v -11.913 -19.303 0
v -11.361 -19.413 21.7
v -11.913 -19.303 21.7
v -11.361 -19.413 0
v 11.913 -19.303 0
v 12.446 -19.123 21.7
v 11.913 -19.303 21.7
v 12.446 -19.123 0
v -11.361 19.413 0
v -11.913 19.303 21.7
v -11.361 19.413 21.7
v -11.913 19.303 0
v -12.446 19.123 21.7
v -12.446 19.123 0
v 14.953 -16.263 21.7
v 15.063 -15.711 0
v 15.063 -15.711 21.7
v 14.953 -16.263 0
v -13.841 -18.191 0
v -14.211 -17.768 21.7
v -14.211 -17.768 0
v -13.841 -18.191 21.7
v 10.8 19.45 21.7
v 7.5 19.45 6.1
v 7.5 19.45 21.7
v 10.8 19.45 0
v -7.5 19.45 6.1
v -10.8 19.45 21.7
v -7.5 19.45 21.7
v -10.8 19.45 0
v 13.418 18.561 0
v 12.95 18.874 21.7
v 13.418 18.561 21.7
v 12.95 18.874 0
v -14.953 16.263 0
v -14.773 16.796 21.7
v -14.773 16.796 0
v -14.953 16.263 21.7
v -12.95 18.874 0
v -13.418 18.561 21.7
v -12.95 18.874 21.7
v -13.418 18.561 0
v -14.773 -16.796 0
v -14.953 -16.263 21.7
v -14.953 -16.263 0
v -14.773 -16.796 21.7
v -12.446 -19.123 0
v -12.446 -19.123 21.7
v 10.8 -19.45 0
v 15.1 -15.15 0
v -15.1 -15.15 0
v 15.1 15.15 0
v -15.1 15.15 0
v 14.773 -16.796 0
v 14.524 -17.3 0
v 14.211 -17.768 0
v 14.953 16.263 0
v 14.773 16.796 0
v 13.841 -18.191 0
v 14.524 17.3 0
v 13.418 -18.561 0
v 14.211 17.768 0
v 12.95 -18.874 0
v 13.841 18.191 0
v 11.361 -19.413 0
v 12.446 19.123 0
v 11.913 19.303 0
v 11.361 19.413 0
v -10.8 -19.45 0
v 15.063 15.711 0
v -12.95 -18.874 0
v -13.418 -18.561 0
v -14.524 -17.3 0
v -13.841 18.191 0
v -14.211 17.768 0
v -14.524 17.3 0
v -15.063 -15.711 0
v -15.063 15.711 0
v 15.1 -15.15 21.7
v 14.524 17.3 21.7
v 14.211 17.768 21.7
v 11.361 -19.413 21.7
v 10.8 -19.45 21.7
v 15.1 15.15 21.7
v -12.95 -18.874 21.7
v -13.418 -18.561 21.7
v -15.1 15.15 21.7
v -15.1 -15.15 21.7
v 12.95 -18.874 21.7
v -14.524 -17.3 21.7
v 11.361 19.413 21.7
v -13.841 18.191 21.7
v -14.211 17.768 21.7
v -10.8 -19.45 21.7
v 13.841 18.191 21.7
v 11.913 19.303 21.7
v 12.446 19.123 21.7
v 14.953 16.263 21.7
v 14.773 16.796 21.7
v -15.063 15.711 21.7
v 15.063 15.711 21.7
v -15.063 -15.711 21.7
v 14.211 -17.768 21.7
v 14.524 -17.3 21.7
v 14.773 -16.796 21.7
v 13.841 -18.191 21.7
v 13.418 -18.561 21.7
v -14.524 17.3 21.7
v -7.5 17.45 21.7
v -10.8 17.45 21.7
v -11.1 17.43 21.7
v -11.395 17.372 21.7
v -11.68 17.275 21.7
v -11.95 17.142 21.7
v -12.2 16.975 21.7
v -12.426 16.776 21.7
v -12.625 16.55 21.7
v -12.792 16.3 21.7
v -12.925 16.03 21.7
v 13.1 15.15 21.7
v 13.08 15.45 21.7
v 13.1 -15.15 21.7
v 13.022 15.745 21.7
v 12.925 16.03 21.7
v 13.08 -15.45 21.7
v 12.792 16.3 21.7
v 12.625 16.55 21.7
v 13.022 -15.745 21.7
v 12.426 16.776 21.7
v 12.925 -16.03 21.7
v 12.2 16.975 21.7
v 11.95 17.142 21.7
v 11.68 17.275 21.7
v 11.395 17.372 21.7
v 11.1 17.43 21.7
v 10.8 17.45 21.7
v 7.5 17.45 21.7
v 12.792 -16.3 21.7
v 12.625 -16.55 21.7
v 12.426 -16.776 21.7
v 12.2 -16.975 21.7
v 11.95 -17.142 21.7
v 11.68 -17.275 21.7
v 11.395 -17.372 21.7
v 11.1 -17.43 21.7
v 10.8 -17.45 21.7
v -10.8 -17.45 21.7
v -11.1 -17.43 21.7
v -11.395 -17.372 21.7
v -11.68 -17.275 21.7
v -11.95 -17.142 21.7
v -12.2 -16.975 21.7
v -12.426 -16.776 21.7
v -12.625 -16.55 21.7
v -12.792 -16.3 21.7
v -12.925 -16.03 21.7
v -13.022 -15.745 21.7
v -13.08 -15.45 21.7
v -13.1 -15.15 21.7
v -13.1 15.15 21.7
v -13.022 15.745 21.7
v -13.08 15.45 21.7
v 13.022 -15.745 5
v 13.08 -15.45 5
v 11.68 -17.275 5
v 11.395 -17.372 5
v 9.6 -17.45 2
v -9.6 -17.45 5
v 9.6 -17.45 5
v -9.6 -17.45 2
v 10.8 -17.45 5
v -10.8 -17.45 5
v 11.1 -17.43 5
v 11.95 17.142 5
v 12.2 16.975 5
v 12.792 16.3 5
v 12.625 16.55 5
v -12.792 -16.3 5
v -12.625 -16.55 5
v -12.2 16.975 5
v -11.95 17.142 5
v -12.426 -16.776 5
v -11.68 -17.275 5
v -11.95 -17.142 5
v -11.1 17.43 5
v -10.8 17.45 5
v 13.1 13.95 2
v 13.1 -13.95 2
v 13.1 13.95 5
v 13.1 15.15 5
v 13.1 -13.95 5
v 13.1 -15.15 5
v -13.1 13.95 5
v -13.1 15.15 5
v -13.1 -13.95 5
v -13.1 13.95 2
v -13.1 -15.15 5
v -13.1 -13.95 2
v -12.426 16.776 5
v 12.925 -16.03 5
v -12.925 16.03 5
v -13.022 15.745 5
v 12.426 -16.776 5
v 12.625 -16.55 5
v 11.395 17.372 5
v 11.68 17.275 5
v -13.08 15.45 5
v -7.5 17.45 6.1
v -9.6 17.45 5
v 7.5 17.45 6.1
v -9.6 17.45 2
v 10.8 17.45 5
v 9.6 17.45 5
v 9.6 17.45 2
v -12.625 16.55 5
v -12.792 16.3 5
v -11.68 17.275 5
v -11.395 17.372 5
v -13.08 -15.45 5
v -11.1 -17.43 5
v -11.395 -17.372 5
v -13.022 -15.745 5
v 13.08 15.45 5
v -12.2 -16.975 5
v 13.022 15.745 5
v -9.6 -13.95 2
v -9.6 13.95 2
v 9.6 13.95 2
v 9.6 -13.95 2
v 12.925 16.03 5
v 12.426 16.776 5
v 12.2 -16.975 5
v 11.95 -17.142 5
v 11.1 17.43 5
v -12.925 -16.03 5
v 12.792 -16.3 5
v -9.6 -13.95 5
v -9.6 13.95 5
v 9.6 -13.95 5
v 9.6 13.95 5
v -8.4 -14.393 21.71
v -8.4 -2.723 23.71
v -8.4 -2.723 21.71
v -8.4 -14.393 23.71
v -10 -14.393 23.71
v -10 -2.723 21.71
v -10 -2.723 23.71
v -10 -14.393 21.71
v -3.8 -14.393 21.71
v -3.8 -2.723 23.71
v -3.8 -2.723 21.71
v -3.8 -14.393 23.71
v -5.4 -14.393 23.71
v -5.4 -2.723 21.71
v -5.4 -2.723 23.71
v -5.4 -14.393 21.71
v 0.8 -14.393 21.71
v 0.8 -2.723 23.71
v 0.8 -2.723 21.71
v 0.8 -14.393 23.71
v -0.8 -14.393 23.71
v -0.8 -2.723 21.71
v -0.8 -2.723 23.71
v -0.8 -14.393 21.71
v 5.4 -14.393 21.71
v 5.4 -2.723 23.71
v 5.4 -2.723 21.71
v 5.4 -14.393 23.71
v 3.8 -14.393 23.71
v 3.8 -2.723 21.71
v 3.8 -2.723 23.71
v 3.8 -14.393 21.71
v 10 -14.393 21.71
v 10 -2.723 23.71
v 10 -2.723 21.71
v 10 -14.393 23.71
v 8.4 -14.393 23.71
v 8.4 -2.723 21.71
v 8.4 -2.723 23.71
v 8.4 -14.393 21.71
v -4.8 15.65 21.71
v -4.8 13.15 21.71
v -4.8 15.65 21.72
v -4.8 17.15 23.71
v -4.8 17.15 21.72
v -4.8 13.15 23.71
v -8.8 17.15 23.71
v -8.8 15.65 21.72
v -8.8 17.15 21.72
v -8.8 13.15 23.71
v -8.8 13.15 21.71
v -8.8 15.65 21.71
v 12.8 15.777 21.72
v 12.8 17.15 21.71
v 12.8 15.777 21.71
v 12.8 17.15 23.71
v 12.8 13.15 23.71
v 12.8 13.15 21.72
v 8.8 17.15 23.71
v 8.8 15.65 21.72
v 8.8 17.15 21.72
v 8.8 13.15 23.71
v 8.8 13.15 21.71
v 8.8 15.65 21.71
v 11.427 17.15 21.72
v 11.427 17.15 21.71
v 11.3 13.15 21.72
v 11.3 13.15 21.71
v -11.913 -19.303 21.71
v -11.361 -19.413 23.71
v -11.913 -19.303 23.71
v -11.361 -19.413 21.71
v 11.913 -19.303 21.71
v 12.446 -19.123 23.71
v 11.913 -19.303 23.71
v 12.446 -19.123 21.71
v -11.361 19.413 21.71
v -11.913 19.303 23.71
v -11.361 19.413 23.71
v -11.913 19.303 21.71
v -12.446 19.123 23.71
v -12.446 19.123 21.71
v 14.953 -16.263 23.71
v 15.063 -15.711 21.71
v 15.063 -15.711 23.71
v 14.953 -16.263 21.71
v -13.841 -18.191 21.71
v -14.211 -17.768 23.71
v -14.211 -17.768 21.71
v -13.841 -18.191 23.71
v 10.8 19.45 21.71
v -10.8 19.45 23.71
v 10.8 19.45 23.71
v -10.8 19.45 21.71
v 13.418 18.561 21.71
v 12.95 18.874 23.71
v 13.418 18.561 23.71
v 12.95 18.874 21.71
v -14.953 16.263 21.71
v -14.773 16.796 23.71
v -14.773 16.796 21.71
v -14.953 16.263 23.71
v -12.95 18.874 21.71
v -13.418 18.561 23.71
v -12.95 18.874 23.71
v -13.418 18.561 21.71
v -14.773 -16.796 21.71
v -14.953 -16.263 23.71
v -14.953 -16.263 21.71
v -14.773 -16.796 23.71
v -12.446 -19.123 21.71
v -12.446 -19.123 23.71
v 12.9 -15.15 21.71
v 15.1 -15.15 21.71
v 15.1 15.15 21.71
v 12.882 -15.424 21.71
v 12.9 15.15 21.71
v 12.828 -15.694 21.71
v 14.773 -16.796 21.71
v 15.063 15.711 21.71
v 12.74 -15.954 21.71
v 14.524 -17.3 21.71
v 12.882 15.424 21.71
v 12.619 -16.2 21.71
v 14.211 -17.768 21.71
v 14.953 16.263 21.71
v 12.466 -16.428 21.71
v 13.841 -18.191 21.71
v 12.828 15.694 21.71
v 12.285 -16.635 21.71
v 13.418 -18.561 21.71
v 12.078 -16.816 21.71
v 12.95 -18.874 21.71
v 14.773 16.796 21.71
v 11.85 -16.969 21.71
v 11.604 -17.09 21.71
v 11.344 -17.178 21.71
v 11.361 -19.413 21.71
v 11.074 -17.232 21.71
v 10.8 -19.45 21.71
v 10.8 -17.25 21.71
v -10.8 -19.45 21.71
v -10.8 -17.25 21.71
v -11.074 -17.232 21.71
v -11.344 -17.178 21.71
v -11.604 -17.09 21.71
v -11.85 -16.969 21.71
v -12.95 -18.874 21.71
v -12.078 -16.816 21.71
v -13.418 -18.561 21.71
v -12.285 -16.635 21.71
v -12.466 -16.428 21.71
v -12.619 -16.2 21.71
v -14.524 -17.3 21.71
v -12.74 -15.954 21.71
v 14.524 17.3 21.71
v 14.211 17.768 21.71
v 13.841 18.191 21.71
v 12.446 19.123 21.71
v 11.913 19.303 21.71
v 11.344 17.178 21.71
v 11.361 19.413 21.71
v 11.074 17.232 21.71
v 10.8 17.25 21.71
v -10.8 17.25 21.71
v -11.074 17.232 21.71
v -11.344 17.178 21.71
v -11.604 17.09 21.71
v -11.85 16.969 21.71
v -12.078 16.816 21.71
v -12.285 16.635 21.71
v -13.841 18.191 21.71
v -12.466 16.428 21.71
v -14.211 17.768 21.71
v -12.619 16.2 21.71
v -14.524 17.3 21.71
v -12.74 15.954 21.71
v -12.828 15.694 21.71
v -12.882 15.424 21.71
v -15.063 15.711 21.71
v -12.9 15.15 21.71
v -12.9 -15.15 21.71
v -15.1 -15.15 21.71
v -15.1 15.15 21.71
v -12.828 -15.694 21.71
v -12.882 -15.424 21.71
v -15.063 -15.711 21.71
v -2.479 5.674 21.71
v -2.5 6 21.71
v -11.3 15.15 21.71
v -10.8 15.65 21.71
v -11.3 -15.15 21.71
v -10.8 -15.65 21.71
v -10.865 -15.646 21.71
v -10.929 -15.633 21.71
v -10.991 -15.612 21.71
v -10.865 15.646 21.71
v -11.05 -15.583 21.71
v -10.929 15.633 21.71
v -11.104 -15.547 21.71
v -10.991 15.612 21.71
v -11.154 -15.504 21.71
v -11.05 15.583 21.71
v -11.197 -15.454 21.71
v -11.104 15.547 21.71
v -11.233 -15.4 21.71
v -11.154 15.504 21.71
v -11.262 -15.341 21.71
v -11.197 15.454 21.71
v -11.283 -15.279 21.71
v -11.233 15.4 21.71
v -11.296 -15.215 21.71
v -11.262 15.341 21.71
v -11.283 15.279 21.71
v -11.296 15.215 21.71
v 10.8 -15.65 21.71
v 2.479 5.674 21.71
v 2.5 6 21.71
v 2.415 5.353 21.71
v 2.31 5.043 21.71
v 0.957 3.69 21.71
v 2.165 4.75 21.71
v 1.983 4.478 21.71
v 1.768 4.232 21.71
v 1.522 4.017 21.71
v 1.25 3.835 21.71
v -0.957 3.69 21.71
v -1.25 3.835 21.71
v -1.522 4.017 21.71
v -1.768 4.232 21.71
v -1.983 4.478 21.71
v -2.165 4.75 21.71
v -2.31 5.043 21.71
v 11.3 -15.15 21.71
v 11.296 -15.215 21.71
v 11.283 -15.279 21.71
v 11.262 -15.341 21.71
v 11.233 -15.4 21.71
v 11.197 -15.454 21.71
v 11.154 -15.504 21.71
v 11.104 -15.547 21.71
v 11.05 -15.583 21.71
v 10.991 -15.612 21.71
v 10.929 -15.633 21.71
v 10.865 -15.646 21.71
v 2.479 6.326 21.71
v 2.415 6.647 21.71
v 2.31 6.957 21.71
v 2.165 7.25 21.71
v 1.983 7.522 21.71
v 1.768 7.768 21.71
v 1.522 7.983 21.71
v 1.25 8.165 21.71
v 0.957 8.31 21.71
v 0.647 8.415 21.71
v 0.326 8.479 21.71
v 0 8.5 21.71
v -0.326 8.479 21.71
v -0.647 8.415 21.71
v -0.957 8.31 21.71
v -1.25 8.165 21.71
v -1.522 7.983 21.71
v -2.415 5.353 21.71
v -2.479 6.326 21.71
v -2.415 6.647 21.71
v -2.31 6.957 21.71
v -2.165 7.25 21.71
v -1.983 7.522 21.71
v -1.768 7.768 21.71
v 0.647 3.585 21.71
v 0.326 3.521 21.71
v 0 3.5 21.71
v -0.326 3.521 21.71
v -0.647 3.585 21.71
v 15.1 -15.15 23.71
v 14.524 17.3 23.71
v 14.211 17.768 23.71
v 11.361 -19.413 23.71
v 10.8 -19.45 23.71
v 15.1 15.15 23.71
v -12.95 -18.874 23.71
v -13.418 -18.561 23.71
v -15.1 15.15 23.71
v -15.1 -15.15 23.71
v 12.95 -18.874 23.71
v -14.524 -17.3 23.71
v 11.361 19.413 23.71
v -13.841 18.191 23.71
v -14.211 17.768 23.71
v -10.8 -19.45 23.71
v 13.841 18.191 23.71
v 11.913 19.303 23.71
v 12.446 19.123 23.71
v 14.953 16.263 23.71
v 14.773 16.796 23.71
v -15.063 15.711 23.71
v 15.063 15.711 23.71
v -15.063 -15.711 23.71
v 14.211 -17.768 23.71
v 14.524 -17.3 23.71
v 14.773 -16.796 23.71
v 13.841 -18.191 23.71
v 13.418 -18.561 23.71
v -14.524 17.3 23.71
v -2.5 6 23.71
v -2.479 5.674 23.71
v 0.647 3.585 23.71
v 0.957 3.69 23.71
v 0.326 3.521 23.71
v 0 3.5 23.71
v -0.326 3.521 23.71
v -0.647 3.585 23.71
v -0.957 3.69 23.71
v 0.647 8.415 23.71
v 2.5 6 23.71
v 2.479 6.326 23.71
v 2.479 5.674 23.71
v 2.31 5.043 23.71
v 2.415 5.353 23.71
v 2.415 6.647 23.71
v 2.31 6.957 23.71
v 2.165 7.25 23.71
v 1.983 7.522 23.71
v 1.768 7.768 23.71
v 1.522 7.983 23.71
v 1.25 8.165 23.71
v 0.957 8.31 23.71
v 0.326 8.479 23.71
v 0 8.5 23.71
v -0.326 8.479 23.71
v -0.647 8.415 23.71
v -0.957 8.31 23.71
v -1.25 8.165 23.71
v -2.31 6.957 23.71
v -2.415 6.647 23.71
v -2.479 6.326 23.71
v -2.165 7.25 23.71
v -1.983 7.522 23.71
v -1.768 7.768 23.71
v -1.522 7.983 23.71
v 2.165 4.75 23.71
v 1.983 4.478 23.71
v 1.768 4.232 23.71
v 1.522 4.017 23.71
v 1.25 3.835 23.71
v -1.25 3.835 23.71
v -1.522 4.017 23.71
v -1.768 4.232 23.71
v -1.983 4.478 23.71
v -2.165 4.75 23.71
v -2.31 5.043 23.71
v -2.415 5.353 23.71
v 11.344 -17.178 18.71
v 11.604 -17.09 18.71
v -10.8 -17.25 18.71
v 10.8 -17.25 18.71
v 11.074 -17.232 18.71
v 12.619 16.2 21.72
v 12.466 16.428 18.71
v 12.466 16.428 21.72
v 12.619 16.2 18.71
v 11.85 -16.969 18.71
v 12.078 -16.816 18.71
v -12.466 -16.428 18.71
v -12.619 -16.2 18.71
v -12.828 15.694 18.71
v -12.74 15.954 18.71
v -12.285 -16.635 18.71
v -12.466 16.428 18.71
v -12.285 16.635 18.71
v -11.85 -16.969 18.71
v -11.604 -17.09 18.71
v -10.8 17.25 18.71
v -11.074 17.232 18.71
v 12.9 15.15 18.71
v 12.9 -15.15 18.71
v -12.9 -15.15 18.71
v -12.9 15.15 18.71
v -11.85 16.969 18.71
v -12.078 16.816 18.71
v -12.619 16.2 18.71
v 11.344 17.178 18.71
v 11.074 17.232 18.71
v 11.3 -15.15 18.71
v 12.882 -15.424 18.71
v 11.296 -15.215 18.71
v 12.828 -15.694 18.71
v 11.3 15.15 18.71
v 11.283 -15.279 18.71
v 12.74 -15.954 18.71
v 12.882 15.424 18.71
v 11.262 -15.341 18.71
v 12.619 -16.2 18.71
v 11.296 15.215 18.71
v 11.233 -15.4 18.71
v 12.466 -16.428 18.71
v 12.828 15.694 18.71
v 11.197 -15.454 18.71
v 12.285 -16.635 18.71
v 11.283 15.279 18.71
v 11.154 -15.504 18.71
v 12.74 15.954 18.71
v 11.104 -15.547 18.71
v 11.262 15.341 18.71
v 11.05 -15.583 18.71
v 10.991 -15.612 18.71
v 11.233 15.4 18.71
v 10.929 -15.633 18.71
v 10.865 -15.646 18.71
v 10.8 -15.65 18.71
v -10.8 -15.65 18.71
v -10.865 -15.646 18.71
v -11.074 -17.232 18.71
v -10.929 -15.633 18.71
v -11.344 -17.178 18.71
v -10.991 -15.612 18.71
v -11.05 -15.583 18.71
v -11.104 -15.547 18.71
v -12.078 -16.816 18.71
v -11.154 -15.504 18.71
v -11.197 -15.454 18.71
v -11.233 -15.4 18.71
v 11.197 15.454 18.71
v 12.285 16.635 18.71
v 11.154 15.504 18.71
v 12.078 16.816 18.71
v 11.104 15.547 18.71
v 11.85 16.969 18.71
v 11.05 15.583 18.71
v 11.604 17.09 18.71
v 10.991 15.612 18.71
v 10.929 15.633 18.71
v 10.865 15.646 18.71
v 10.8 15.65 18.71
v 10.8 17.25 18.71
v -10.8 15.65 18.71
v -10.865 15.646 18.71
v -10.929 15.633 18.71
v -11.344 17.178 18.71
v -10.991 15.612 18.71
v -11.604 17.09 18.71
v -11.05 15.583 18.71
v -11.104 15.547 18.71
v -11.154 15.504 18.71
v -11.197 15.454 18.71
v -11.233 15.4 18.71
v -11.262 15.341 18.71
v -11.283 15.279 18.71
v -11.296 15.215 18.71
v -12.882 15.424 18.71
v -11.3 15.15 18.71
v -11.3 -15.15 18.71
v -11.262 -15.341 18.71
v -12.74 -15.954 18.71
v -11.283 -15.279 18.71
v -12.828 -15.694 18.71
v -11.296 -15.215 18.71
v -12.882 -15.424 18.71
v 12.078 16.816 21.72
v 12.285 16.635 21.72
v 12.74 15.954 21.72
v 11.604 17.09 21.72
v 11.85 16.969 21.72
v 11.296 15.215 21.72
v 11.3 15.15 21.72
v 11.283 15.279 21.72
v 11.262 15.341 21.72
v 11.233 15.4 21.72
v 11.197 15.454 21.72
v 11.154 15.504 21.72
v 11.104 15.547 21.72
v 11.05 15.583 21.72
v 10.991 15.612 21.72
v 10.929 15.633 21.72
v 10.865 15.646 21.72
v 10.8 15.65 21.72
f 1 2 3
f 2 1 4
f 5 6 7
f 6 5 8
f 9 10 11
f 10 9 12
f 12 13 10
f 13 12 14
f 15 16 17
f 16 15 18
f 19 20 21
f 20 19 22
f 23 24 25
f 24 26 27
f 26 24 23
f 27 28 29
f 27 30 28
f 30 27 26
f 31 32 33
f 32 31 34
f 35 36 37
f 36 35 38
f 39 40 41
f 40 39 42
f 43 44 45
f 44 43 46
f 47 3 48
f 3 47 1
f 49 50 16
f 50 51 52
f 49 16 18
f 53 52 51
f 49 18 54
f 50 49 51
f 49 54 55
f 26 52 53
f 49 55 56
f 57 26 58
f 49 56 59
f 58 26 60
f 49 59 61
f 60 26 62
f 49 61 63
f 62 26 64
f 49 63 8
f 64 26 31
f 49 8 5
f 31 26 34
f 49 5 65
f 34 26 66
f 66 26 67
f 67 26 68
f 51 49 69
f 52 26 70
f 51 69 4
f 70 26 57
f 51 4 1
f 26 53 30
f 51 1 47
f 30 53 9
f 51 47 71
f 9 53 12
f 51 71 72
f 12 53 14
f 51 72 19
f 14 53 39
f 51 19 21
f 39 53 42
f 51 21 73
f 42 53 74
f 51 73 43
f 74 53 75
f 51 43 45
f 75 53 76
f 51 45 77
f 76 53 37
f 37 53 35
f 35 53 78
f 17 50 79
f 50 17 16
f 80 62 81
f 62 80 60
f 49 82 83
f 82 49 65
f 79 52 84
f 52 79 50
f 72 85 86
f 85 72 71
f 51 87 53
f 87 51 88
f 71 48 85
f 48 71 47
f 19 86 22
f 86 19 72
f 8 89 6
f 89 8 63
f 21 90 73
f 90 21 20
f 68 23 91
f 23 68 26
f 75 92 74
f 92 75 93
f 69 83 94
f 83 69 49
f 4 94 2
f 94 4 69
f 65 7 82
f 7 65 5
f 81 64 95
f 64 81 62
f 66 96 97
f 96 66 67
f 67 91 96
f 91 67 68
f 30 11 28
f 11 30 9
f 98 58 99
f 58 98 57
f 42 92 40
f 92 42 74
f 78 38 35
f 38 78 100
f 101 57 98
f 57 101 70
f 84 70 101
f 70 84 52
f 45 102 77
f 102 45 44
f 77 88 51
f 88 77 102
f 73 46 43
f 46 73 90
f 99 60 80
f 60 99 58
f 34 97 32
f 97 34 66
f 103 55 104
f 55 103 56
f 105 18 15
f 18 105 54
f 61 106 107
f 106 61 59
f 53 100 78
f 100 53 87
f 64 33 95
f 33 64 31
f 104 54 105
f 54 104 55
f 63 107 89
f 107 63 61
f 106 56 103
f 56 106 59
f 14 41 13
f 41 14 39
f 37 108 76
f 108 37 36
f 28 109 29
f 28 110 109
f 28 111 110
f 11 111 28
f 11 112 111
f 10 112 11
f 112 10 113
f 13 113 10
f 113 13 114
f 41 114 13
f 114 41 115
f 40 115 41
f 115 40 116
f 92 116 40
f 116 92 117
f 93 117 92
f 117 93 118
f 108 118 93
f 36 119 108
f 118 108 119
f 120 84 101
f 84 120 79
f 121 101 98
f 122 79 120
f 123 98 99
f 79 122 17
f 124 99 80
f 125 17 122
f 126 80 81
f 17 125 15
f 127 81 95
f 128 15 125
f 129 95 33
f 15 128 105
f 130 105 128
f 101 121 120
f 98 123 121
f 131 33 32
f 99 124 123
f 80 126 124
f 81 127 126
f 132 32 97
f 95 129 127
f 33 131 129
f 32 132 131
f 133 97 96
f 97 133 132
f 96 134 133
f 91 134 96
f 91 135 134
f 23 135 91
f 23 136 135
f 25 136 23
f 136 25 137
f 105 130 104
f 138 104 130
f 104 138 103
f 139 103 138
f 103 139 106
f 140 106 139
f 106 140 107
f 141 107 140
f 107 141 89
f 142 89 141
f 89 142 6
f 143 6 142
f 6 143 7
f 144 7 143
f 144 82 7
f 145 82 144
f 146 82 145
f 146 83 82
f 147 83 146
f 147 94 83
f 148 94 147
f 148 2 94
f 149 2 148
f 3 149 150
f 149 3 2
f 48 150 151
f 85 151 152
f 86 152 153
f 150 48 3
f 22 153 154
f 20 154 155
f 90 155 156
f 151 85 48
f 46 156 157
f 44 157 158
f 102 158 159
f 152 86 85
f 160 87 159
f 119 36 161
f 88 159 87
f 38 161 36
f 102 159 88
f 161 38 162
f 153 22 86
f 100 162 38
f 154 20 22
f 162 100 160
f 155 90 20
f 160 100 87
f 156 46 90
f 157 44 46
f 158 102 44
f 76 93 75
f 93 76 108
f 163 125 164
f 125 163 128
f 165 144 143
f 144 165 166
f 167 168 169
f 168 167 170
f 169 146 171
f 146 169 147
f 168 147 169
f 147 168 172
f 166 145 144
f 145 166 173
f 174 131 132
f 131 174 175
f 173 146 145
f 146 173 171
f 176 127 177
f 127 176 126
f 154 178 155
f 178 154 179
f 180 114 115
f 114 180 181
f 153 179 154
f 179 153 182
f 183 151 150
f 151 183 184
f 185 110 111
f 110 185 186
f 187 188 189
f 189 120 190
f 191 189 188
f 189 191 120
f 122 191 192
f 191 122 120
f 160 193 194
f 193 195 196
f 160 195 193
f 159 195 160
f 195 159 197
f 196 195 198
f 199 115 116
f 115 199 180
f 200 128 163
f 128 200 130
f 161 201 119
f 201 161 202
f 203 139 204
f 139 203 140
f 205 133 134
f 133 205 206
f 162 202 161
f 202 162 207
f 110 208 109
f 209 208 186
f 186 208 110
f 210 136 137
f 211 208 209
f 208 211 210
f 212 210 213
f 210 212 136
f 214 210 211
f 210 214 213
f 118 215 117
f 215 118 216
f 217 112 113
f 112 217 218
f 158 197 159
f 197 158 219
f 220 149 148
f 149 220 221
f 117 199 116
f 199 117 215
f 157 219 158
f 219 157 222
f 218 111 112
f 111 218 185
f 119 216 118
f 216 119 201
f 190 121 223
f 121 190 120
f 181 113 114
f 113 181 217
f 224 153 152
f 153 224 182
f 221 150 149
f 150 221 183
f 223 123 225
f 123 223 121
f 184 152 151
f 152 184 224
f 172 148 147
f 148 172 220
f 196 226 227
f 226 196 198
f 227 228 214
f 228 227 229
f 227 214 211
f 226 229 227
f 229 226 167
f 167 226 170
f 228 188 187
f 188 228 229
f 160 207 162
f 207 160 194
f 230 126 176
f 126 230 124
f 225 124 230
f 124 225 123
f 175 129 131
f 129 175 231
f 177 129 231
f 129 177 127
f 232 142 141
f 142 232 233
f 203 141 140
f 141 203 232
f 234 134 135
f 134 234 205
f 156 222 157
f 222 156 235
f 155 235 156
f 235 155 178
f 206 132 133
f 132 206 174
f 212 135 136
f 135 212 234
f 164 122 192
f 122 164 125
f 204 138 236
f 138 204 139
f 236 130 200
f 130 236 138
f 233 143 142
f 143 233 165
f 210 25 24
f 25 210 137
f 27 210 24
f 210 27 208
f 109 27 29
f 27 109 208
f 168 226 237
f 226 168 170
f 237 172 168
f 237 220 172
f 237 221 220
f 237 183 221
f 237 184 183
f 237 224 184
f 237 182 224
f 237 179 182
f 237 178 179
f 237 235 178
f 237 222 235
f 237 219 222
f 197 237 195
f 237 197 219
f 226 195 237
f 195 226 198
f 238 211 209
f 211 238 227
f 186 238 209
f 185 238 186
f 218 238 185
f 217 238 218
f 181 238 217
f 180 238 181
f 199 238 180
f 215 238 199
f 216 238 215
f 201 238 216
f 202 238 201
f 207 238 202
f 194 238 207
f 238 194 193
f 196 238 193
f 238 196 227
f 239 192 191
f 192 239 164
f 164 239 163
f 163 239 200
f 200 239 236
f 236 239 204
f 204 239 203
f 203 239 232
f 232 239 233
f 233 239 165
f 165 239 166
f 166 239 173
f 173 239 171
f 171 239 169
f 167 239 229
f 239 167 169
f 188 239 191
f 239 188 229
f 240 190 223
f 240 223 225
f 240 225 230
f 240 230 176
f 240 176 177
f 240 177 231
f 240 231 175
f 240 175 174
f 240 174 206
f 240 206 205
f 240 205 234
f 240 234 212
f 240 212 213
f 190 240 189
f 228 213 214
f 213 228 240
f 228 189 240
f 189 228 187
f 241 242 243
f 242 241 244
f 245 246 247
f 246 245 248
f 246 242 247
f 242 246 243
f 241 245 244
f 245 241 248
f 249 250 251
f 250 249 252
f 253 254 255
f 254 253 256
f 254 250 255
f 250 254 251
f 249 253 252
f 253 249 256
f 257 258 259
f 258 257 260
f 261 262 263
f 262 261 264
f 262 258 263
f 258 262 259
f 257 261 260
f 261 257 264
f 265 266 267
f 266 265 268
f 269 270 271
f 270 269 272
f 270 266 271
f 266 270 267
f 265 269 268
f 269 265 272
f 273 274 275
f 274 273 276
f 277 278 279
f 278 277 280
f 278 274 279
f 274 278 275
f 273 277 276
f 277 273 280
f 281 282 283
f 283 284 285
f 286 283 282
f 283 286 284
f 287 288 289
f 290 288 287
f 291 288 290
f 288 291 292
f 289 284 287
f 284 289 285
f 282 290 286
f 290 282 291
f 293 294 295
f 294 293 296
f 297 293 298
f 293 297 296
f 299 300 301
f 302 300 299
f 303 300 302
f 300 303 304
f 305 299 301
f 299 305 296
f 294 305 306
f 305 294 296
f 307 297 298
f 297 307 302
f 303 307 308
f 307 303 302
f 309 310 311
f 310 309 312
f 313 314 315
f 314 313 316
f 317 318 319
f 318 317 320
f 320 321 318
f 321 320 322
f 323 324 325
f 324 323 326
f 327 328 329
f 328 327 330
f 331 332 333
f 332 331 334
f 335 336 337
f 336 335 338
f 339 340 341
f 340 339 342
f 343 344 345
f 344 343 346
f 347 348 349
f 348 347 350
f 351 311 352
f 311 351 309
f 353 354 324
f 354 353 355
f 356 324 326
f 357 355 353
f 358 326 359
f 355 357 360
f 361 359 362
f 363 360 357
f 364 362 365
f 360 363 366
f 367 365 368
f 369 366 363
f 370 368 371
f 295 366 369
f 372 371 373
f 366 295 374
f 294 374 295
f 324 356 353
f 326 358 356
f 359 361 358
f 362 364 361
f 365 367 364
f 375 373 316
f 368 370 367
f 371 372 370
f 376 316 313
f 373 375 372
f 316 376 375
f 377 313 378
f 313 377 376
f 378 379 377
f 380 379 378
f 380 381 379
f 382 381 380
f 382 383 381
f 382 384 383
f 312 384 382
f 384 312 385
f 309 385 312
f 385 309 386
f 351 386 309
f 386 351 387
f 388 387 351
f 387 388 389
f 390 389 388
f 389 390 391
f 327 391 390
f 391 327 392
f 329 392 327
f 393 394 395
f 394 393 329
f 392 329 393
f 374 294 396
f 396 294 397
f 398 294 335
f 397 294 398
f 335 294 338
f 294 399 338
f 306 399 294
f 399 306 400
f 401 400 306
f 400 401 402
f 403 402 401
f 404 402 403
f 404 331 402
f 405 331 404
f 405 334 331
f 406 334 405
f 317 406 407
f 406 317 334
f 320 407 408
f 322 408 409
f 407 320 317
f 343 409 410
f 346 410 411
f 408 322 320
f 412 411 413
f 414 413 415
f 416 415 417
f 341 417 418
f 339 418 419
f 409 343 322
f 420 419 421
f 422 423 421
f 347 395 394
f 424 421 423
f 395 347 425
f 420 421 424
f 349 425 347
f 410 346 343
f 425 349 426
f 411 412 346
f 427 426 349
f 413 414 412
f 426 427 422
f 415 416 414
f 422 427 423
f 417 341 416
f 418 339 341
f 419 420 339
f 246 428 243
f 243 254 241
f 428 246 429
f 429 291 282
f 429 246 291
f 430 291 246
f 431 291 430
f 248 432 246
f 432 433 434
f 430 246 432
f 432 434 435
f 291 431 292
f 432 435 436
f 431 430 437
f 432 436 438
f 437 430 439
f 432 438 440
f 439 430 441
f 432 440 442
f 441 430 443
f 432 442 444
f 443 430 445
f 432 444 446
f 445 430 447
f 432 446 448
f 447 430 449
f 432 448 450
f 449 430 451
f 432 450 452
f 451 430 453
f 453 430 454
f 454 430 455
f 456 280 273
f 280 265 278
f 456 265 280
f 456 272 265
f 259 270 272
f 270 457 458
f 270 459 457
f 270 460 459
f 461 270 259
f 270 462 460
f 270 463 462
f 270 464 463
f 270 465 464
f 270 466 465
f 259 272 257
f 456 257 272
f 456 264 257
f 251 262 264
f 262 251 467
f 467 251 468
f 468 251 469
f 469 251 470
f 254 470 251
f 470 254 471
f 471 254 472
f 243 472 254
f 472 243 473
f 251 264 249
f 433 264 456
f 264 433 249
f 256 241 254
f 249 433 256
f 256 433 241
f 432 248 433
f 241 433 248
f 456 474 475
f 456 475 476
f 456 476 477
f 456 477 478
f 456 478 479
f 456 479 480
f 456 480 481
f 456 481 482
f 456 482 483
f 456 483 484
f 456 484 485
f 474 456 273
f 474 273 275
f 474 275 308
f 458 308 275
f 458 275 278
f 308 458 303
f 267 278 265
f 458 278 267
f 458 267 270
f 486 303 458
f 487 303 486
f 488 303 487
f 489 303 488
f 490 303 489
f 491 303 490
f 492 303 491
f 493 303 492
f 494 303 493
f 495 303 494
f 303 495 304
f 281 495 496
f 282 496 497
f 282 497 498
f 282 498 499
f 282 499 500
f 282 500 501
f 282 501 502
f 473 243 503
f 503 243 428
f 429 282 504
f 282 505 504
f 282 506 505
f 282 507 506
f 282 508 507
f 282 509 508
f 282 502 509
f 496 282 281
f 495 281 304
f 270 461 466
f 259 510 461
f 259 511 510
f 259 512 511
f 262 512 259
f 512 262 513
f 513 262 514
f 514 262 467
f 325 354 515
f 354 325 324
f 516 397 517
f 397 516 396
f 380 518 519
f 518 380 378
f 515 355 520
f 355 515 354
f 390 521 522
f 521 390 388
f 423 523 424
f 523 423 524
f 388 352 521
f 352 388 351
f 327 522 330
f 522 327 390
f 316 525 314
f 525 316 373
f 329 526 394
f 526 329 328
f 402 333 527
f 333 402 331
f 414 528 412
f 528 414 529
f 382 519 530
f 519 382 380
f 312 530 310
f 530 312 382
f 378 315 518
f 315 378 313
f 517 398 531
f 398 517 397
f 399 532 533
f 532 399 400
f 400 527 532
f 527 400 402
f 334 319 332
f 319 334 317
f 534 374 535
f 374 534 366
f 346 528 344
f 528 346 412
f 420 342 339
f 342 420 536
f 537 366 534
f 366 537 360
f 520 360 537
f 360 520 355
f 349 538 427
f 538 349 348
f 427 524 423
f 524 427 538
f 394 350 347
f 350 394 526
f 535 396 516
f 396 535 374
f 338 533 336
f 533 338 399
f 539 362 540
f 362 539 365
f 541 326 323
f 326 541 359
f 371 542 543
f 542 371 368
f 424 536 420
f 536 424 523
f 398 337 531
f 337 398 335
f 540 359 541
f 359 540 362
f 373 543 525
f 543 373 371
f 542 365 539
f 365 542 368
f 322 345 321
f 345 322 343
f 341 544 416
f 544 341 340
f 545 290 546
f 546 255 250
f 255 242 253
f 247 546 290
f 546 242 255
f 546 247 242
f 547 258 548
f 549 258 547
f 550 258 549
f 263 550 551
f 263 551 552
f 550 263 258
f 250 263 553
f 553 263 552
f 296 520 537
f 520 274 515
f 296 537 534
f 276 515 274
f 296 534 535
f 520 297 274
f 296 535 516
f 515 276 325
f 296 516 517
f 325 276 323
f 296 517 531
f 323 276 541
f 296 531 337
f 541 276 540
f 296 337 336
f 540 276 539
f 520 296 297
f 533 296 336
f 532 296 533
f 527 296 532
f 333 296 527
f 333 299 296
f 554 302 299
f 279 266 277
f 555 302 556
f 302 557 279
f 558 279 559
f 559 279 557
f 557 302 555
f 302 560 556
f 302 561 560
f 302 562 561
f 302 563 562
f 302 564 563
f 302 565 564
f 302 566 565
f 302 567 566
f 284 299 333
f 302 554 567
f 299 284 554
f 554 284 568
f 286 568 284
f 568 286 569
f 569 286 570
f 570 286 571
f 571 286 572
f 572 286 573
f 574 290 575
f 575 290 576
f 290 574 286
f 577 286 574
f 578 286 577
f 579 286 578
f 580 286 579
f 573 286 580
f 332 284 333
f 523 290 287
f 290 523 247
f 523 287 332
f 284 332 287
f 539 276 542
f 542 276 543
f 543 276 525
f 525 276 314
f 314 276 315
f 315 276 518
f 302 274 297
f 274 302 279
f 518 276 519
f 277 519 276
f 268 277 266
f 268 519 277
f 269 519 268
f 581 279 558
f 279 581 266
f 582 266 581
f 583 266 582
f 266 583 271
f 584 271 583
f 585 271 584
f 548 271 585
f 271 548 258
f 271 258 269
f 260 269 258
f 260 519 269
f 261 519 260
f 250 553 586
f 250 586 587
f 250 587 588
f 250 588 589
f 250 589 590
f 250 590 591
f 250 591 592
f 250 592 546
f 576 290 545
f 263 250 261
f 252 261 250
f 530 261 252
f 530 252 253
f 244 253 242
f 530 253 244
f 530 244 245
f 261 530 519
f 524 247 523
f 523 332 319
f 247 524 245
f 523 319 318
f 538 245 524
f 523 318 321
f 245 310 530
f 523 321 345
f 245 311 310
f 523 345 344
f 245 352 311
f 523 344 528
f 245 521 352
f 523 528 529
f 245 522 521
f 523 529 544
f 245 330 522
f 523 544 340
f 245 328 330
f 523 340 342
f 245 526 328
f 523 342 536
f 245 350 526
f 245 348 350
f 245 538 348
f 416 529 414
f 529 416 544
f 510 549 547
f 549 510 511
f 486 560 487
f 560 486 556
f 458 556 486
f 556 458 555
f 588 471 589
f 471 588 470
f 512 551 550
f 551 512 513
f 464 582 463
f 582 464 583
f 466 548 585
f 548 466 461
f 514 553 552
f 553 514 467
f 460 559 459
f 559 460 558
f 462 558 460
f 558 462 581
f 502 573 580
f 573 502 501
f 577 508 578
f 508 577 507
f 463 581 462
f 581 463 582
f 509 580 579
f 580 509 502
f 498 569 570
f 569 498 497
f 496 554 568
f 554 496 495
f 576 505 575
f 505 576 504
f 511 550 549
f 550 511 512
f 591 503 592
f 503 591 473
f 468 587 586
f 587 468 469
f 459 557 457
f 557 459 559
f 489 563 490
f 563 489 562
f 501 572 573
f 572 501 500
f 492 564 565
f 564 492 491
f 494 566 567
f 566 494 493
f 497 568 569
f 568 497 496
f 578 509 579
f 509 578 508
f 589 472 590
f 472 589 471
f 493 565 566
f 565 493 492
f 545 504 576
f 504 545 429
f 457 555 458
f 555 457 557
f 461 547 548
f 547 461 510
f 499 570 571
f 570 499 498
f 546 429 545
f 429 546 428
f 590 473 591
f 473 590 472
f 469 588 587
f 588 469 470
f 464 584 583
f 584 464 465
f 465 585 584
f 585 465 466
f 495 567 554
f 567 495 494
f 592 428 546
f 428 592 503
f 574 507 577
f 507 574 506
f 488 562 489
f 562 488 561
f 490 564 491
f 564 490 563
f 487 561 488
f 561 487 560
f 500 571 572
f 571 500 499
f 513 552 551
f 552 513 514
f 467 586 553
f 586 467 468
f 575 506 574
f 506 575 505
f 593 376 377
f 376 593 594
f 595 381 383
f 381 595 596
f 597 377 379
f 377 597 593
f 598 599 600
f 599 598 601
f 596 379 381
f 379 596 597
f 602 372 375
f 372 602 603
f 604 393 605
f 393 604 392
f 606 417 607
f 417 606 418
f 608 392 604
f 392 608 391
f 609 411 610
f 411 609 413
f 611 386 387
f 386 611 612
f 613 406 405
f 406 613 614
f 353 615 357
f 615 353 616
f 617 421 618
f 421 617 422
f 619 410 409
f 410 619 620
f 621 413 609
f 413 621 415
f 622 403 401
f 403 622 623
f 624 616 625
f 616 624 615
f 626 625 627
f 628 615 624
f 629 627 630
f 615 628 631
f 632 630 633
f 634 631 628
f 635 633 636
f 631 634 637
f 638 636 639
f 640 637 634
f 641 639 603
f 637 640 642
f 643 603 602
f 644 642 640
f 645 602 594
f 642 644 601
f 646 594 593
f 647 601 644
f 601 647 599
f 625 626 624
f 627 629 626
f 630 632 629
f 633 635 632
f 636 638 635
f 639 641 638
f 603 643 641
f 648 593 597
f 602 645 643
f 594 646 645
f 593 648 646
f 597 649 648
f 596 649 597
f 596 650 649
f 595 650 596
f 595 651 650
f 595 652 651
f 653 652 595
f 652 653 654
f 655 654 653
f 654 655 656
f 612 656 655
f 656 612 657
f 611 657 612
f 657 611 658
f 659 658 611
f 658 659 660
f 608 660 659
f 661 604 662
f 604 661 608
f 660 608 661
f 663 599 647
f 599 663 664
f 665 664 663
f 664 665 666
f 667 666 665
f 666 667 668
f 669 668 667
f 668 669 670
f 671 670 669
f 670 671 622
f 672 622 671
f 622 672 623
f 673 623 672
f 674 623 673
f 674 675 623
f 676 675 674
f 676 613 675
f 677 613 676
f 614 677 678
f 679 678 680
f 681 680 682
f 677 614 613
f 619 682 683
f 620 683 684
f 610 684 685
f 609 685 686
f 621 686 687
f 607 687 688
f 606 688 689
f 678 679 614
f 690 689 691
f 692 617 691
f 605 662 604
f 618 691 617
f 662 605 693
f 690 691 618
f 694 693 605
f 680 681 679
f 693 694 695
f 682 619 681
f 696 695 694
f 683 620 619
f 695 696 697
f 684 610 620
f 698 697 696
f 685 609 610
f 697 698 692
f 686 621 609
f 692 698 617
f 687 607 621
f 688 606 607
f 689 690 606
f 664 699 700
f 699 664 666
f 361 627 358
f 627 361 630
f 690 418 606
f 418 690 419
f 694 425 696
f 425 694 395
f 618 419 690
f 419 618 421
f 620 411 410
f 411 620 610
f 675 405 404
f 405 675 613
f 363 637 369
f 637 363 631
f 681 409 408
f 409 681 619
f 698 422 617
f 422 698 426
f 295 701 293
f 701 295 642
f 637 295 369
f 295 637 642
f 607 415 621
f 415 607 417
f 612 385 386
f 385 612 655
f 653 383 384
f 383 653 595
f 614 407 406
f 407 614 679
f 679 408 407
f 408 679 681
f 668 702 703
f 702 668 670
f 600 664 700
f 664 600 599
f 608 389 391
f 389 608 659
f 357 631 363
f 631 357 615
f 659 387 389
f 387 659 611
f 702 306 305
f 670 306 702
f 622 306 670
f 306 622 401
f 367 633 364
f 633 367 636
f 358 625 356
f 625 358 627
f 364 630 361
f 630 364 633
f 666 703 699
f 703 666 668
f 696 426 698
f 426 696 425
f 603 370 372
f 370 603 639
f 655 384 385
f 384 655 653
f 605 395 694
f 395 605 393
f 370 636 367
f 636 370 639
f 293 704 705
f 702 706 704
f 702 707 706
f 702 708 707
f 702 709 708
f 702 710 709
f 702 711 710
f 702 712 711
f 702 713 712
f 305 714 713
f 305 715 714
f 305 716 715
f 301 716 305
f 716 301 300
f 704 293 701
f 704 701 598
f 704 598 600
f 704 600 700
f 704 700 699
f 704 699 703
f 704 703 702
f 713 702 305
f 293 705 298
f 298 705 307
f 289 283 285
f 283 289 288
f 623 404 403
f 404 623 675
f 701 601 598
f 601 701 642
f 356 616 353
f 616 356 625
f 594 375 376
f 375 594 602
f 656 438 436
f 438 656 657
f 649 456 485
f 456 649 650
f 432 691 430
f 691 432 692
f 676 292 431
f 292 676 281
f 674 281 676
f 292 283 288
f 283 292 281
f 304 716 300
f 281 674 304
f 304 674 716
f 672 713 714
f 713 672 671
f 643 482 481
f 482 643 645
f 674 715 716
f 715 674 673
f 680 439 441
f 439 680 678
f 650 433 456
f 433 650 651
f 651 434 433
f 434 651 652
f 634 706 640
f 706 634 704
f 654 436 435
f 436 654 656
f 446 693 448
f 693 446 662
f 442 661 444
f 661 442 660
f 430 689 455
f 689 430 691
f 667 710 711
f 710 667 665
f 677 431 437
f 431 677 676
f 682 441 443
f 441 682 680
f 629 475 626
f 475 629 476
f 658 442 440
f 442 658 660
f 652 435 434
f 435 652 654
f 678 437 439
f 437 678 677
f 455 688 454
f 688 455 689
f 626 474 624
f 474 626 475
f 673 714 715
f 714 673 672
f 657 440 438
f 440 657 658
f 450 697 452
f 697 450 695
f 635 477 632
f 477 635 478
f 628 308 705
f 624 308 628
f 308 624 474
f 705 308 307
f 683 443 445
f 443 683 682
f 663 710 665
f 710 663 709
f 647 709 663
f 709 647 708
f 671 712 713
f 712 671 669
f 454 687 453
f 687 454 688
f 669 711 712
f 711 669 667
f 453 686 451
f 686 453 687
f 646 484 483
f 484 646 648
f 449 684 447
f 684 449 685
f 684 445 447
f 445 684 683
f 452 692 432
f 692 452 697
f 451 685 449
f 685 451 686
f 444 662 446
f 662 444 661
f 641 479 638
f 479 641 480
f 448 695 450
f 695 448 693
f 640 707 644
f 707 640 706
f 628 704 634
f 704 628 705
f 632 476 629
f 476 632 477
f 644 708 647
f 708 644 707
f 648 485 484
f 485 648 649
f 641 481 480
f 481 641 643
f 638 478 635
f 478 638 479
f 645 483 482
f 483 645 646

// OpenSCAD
// file: params.scad
// Enclosure parameters for the LOLIN C3 mini + DIYLess OpenTherm Master Shield stack.
//
// Values derived from datasheets/standard parts and from the owner's photos of the real
// assembly (see docs/enclosure-design.md section 2). Change a number here and re-render --
// nothing in case.scad is hard-coded. Kept separate from the geometry so both files stay well
// under the 350-line hand-written-source ceiling (CLAUDE.md).

// ---- Which part to render -------------------------------------------------
part = "assembly";      // "base" | "lid" | "assembly" (preview with a translucent board mock)
cut  = false;           // debug preview: slice the +X half away to inspect the internal fit

// ---- Board stack -- C3 on TOP, shield on BOTTOM (confirmed from the owner's photos) -------
// The tall parts (KF128 terminal + optocouplers) sit BETWEEN the boards, so the board gap
// already CONTAINS them -- their height is NOT added on top of the stack. This is the fix for
// the box being too tall: the KF128 lives in the gap, it does not stack above the shield.
board_l      = 34.3;    // long side  (C3 34.3 / shield 34.2 -> take the larger)
board_w      = 25.6;    // short side (C3 25.4 / shield 25.6 -> take the larger)
board_r      = 2.0;     // PCB corner radius (D1-mini family)
c3_thick     = 1.6;     // LOLIN C3 mini PCB (the TOP board)
shield_thick = 1.6;     // DIYLess shield PCB (the BOTTOM board)
board_gap    = 10.0;    // shield top -> C3 bottom. Holds the ~9.5 mm KF128 + optocouplers.
                        // DOMINANT height number now; measure the assembled gap to trim it.
below_h      = 3.0;     // clearance under the shield for the down-pins, trimmed nearly flush
top_clear    = 3.5;     // headroom over the C3's top face: just the USB-C shell (~3.2 mm) + buttons

// ---- Shell (mm) -----------------------------------------------------------
wall     = 2.0;         // side-wall thickness (5x 0.4 mm perimeters)
floor_t  = 2.0;         // base floor
lid_t    = 2.0;         // lid top plate
fit      = 0.3;         // clearance around the PCB edge, per side (FDM slot tolerance)

// ---- Lid join (friction fit) ----------------------------------------------
rim_h    = 3.0;         // how deep the lid rim sinks into the base
rim_w    = 1.6;         // rim wall thickness
snap_fit = 0.2;         // clearance between lid rim and cavity wall, per side

// ---- Front (+Y) short edge: USB-C (C3 level) + boiler KF128 (gap level), same end ---------
// The owner wires both out the same short edge. One tall front window exposes the KF128 in the
// gap (lower) and the USB-C on the C3 top edge (upper); both cables leave here.
front_win_w = 15.0;     // width of the front window (covers USB-C plug + KF128 + wires)

// ---- Lid top: RGB LED window + button poke-holes --------------------------
// C3 is the top board, so its LED, RST and BOOT face UP toward the lid -- reached from the top.
led_win_d        = 5.0;    // LED window diameter (over the WS2812B, GPIO7)
led_win_membrane = 0.8;    // leave this thin translucent wall to diffuse the LED
led_through      = false;  // true = clean through-hole (for a light pipe / resin drop)
led_x            = 0;      // LED position on the C3 top (from the photo: front-of-centre)
led_y            = 6.0;    //   +Y is the USB/front edge
btn_hole_w       = 4.0;    // poke-hole over each button (press RST/BOOT through the lid)
btn_hole_x       = board_w/2 - 4.0;   // near the front corners
btn_hole_y       = board_l/2 - 4.0;   // near the front (USB) edge

// ---- Ventilation (lid, back half so it clears the LED/buttons) -------------
vent_slot_w = 1.6;
vent_slots  = 5;

// ---- Rendering ------------------------------------------------------------
$fn = 48;
// main file
// Parametric enclosure for the LOLIN C3 mini + DIYLess OpenTherm Master Shield stack.
//
// Geometry only -- all numbers live in params.scad. Rationale is in docs/enclosure-design.md;
// the load-bearing facts a reader needs while editing this file (all confirmed by the owner's
// photos of the real assembly):
//
//  * The C3 is the TOP board, the shield the BOTTOM board. So the C3's USB-C, RST, BOOT and RGB
//    LED face UP toward the lid -- reached from the top. That is why the LED window and the
//    button poke-holes are in the LID, not the walls.
//  * The tall parts (KF128 terminal + optocouplers) sit BETWEEN the boards, inside board_gap --
//    their height is NOT stacked on top. This is why the box is only ~24 mm tall.
//  * USB-C (C3 top edge) and the boiler KF128 (gap level) exit the SAME front (+Y) short edge,
//    through one tall front window.
//  * Coordinates: origin at the footprint centre, Z=0 at the outer bottom. +Y = front (the
//    USB/KF128 edge). The shield sits on four floor posts; the C3 rides above it on the headers.
//  * Base and lid print open-face-up with no supports.

include <params.scad>

// ---- Derived geometry -----------------------------------------------------
cav_x = board_w + 2*fit;          // cavity footprint, short axis (X)
cav_y = board_l + 2*fit;          // cavity footprint, long axis  (Y)
ext_x = cav_x + 2*wall;
ext_y = cav_y + 2*wall;
in_r  = board_r + fit;
out_r = in_r + wall;

cavity_h = below_h + shield_thick + board_gap + c3_thick + top_clear;
base_h   = floor_t + cavity_h;    // Z of the base top rim

// Z landmarks from the outer bottom (0), shield BELOW, C3 ABOVE
z_shield_bot = floor_t + below_h;
z_shield_top = z_shield_bot + shield_thick;
z_c3_bot     = z_shield_top + board_gap;
z_c3_top     = z_c3_bot + c3_thick;

eps = 0.01;
big = max(ext_x, ext_y) + 20;

// ---- Helper: rounded rectangular prism, centred in XY, from z=0 up --------
// offset(-r) then offset(+r) rounds the corners to radius r while preserving the sx*sy box
// (needs r < min(sx,sy)/2 -- callers guard the small insets).
module rrect(sx, sy, h, r) {
  linear_extrude(height = h)
    offset(r = r) offset(r = -r)
      square([sx, sy], center = true);
}

// ---- Base -----------------------------------------------------------------
module base() {
  difference() {
    rrect(ext_x, ext_y, base_h, out_r);                 // solid outer block
    translate([0, 0, floor_t])                          // hollow, open at the top
      rrect(cav_x, cav_y, cavity_h + big, in_r);
    front_window();
  }
  corner_posts();                                        // the shield rests on these
}

// Four posts the BOTTOM board (shield) sits on, clearing its trimmed down-pins. Lateral hold
// comes from the cavity walls (fit clearance), not the posts.
module corner_posts() {
  p = 3.5;
  for (sx = [-1, 1], sy = [-1, 1])
    translate([ sx*(cav_x/2 - p/2), sy*(cav_y/2 - p/2), floor_t + below_h/2 ])
      cube([p, p, below_h], center = true);
}

// One tall opening on the front (+Y) wall: the KF128 in the gap (lower) and the USB-C on the C3
// top edge (upper) both show here, and both cables leave here. It runs up through the rim (the
// lid caps it), so there is no bridge.
module front_window() {
  z0 = z_shield_top - 0.5;
  translate([0, cav_y/2, (z0 + base_h + 1)/2])
    cube([front_win_w, 3*wall, (base_h + 1) - z0], center = true);
}

// ---- Lid ------------------------------------------------------------------
module lid() {
  translate([0, 0, base_h + eps])
  union() {
    difference() {
      rrect(ext_x, ext_y, lid_t, out_r);
      vents();
      led_window();
      button_holes();
    }
    // friction rim dropping into the cavity
    translate([0, 0, -rim_h])
      difference() {
        rrect(cav_x - 2*snap_fit, cav_y - 2*snap_fit, rim_h + eps, max(in_r - snap_fit, 0.4));
        translate([0, 0, -eps])
          rrect(cav_x - 2*snap_fit - 2*rim_w,
                cav_y - 2*snap_fit - 2*rim_w,
                rim_h + 3*eps,
                max(in_r - snap_fit - rim_w, 0.4));
      }
  }
}

// LED window over the WS2812B: a thin translucent membrane by default (leaves led_win_membrane
// of plate), or a clean through-hole if led_through.
module led_window() {
  keep = led_through ? 0 : led_win_membrane;   // plate left on the outer (top) face
  translate([led_x, led_y, keep - 1])
    cylinder(h = lid_t - keep + 1, d = led_win_d);
}

// Poke-holes over RST and BOOT (C3 faces up): press the button with a pin through the hole.
module button_holes() {
  for (s = [-1, 1])
    translate([s*btn_hole_x, btn_hole_y, -1])
      cube([btn_hole_w, btn_hole_w, lid_t + 2], center = false);
}

// Slots in the lid, kept in the back half so they never clash with the LED/button holes.
module vents() {
  sl = ext_y * 0.30;
  g  = 3;
  for (i = [0 : vent_slots - 1])
    translate([ (i - (vent_slots - 1)/2) * (vent_slot_w + g), -ext_y*0.22, lid_t/2 ])
      cube([vent_slot_w, sl, lid_t + 2], center = true);
}

// ---- Board mock (preview only) --------------------------------------------
// A translucent stand-in for the real stack (shield below, C3 above, tall parts in the gap).
// Not part of any printed body.
module board_mock() {
  color([0.15, 0.30, 0.55, 0.85]) translate([0, 0, z_shield_bot]) rrect(board_w, board_l, shield_thick, board_r);
  color([0.10, 0.40, 0.15, 0.85]) translate([0, 0, z_c3_bot])     rrect(board_w, board_l, c3_thick, board_r);
  // KF128 on the shield's front edge, standing in the gap
  color([0.10, 0.50, 0.20, 0.90]) translate([0,  board_l/2 - 5, z_shield_top + board_gap/2]) cube([11, 7, board_gap - 0.5], center = true);
  // optocouplers block in the gap
  color([0.12, 0.12, 0.12, 0.90]) translate([1, -3, z_shield_top + (board_gap-1)/2]) cube([13, 11, board_gap - 1], center = true);
  // USB-C on the C3 top front edge
  color([0.70, 0.70, 0.70, 0.90]) translate([0,  board_l/2 - 3, z_c3_top + 1.6]) cube([9, 7, 3.2], center = true);
  // WS2812B on the C3 top
  color([0.20, 0.85, 0.75, 0.95]) translate([led_x, led_y, z_c3_top + 0.8]) cube([5, 5, 1.6], center = true);
}

// ---- Part selector --------------------------------------------------------
module shells() {
  if (part == "base")      base();
  else if (part == "lid")  lid();
  else { base(); lid(); }              // "assembly" -- both shells
}

if (cut)                               // slice the +X half away, board mock solid, to inspect fit
  difference() {
    union() { shells(); board_mock(); }
    translate([big/2, 0, base_h/2])
      cube([big, ext_y + big, base_h + big], center = true);
  }
else {
  shells();
  if (part == "assembly") %board_mock();
}
